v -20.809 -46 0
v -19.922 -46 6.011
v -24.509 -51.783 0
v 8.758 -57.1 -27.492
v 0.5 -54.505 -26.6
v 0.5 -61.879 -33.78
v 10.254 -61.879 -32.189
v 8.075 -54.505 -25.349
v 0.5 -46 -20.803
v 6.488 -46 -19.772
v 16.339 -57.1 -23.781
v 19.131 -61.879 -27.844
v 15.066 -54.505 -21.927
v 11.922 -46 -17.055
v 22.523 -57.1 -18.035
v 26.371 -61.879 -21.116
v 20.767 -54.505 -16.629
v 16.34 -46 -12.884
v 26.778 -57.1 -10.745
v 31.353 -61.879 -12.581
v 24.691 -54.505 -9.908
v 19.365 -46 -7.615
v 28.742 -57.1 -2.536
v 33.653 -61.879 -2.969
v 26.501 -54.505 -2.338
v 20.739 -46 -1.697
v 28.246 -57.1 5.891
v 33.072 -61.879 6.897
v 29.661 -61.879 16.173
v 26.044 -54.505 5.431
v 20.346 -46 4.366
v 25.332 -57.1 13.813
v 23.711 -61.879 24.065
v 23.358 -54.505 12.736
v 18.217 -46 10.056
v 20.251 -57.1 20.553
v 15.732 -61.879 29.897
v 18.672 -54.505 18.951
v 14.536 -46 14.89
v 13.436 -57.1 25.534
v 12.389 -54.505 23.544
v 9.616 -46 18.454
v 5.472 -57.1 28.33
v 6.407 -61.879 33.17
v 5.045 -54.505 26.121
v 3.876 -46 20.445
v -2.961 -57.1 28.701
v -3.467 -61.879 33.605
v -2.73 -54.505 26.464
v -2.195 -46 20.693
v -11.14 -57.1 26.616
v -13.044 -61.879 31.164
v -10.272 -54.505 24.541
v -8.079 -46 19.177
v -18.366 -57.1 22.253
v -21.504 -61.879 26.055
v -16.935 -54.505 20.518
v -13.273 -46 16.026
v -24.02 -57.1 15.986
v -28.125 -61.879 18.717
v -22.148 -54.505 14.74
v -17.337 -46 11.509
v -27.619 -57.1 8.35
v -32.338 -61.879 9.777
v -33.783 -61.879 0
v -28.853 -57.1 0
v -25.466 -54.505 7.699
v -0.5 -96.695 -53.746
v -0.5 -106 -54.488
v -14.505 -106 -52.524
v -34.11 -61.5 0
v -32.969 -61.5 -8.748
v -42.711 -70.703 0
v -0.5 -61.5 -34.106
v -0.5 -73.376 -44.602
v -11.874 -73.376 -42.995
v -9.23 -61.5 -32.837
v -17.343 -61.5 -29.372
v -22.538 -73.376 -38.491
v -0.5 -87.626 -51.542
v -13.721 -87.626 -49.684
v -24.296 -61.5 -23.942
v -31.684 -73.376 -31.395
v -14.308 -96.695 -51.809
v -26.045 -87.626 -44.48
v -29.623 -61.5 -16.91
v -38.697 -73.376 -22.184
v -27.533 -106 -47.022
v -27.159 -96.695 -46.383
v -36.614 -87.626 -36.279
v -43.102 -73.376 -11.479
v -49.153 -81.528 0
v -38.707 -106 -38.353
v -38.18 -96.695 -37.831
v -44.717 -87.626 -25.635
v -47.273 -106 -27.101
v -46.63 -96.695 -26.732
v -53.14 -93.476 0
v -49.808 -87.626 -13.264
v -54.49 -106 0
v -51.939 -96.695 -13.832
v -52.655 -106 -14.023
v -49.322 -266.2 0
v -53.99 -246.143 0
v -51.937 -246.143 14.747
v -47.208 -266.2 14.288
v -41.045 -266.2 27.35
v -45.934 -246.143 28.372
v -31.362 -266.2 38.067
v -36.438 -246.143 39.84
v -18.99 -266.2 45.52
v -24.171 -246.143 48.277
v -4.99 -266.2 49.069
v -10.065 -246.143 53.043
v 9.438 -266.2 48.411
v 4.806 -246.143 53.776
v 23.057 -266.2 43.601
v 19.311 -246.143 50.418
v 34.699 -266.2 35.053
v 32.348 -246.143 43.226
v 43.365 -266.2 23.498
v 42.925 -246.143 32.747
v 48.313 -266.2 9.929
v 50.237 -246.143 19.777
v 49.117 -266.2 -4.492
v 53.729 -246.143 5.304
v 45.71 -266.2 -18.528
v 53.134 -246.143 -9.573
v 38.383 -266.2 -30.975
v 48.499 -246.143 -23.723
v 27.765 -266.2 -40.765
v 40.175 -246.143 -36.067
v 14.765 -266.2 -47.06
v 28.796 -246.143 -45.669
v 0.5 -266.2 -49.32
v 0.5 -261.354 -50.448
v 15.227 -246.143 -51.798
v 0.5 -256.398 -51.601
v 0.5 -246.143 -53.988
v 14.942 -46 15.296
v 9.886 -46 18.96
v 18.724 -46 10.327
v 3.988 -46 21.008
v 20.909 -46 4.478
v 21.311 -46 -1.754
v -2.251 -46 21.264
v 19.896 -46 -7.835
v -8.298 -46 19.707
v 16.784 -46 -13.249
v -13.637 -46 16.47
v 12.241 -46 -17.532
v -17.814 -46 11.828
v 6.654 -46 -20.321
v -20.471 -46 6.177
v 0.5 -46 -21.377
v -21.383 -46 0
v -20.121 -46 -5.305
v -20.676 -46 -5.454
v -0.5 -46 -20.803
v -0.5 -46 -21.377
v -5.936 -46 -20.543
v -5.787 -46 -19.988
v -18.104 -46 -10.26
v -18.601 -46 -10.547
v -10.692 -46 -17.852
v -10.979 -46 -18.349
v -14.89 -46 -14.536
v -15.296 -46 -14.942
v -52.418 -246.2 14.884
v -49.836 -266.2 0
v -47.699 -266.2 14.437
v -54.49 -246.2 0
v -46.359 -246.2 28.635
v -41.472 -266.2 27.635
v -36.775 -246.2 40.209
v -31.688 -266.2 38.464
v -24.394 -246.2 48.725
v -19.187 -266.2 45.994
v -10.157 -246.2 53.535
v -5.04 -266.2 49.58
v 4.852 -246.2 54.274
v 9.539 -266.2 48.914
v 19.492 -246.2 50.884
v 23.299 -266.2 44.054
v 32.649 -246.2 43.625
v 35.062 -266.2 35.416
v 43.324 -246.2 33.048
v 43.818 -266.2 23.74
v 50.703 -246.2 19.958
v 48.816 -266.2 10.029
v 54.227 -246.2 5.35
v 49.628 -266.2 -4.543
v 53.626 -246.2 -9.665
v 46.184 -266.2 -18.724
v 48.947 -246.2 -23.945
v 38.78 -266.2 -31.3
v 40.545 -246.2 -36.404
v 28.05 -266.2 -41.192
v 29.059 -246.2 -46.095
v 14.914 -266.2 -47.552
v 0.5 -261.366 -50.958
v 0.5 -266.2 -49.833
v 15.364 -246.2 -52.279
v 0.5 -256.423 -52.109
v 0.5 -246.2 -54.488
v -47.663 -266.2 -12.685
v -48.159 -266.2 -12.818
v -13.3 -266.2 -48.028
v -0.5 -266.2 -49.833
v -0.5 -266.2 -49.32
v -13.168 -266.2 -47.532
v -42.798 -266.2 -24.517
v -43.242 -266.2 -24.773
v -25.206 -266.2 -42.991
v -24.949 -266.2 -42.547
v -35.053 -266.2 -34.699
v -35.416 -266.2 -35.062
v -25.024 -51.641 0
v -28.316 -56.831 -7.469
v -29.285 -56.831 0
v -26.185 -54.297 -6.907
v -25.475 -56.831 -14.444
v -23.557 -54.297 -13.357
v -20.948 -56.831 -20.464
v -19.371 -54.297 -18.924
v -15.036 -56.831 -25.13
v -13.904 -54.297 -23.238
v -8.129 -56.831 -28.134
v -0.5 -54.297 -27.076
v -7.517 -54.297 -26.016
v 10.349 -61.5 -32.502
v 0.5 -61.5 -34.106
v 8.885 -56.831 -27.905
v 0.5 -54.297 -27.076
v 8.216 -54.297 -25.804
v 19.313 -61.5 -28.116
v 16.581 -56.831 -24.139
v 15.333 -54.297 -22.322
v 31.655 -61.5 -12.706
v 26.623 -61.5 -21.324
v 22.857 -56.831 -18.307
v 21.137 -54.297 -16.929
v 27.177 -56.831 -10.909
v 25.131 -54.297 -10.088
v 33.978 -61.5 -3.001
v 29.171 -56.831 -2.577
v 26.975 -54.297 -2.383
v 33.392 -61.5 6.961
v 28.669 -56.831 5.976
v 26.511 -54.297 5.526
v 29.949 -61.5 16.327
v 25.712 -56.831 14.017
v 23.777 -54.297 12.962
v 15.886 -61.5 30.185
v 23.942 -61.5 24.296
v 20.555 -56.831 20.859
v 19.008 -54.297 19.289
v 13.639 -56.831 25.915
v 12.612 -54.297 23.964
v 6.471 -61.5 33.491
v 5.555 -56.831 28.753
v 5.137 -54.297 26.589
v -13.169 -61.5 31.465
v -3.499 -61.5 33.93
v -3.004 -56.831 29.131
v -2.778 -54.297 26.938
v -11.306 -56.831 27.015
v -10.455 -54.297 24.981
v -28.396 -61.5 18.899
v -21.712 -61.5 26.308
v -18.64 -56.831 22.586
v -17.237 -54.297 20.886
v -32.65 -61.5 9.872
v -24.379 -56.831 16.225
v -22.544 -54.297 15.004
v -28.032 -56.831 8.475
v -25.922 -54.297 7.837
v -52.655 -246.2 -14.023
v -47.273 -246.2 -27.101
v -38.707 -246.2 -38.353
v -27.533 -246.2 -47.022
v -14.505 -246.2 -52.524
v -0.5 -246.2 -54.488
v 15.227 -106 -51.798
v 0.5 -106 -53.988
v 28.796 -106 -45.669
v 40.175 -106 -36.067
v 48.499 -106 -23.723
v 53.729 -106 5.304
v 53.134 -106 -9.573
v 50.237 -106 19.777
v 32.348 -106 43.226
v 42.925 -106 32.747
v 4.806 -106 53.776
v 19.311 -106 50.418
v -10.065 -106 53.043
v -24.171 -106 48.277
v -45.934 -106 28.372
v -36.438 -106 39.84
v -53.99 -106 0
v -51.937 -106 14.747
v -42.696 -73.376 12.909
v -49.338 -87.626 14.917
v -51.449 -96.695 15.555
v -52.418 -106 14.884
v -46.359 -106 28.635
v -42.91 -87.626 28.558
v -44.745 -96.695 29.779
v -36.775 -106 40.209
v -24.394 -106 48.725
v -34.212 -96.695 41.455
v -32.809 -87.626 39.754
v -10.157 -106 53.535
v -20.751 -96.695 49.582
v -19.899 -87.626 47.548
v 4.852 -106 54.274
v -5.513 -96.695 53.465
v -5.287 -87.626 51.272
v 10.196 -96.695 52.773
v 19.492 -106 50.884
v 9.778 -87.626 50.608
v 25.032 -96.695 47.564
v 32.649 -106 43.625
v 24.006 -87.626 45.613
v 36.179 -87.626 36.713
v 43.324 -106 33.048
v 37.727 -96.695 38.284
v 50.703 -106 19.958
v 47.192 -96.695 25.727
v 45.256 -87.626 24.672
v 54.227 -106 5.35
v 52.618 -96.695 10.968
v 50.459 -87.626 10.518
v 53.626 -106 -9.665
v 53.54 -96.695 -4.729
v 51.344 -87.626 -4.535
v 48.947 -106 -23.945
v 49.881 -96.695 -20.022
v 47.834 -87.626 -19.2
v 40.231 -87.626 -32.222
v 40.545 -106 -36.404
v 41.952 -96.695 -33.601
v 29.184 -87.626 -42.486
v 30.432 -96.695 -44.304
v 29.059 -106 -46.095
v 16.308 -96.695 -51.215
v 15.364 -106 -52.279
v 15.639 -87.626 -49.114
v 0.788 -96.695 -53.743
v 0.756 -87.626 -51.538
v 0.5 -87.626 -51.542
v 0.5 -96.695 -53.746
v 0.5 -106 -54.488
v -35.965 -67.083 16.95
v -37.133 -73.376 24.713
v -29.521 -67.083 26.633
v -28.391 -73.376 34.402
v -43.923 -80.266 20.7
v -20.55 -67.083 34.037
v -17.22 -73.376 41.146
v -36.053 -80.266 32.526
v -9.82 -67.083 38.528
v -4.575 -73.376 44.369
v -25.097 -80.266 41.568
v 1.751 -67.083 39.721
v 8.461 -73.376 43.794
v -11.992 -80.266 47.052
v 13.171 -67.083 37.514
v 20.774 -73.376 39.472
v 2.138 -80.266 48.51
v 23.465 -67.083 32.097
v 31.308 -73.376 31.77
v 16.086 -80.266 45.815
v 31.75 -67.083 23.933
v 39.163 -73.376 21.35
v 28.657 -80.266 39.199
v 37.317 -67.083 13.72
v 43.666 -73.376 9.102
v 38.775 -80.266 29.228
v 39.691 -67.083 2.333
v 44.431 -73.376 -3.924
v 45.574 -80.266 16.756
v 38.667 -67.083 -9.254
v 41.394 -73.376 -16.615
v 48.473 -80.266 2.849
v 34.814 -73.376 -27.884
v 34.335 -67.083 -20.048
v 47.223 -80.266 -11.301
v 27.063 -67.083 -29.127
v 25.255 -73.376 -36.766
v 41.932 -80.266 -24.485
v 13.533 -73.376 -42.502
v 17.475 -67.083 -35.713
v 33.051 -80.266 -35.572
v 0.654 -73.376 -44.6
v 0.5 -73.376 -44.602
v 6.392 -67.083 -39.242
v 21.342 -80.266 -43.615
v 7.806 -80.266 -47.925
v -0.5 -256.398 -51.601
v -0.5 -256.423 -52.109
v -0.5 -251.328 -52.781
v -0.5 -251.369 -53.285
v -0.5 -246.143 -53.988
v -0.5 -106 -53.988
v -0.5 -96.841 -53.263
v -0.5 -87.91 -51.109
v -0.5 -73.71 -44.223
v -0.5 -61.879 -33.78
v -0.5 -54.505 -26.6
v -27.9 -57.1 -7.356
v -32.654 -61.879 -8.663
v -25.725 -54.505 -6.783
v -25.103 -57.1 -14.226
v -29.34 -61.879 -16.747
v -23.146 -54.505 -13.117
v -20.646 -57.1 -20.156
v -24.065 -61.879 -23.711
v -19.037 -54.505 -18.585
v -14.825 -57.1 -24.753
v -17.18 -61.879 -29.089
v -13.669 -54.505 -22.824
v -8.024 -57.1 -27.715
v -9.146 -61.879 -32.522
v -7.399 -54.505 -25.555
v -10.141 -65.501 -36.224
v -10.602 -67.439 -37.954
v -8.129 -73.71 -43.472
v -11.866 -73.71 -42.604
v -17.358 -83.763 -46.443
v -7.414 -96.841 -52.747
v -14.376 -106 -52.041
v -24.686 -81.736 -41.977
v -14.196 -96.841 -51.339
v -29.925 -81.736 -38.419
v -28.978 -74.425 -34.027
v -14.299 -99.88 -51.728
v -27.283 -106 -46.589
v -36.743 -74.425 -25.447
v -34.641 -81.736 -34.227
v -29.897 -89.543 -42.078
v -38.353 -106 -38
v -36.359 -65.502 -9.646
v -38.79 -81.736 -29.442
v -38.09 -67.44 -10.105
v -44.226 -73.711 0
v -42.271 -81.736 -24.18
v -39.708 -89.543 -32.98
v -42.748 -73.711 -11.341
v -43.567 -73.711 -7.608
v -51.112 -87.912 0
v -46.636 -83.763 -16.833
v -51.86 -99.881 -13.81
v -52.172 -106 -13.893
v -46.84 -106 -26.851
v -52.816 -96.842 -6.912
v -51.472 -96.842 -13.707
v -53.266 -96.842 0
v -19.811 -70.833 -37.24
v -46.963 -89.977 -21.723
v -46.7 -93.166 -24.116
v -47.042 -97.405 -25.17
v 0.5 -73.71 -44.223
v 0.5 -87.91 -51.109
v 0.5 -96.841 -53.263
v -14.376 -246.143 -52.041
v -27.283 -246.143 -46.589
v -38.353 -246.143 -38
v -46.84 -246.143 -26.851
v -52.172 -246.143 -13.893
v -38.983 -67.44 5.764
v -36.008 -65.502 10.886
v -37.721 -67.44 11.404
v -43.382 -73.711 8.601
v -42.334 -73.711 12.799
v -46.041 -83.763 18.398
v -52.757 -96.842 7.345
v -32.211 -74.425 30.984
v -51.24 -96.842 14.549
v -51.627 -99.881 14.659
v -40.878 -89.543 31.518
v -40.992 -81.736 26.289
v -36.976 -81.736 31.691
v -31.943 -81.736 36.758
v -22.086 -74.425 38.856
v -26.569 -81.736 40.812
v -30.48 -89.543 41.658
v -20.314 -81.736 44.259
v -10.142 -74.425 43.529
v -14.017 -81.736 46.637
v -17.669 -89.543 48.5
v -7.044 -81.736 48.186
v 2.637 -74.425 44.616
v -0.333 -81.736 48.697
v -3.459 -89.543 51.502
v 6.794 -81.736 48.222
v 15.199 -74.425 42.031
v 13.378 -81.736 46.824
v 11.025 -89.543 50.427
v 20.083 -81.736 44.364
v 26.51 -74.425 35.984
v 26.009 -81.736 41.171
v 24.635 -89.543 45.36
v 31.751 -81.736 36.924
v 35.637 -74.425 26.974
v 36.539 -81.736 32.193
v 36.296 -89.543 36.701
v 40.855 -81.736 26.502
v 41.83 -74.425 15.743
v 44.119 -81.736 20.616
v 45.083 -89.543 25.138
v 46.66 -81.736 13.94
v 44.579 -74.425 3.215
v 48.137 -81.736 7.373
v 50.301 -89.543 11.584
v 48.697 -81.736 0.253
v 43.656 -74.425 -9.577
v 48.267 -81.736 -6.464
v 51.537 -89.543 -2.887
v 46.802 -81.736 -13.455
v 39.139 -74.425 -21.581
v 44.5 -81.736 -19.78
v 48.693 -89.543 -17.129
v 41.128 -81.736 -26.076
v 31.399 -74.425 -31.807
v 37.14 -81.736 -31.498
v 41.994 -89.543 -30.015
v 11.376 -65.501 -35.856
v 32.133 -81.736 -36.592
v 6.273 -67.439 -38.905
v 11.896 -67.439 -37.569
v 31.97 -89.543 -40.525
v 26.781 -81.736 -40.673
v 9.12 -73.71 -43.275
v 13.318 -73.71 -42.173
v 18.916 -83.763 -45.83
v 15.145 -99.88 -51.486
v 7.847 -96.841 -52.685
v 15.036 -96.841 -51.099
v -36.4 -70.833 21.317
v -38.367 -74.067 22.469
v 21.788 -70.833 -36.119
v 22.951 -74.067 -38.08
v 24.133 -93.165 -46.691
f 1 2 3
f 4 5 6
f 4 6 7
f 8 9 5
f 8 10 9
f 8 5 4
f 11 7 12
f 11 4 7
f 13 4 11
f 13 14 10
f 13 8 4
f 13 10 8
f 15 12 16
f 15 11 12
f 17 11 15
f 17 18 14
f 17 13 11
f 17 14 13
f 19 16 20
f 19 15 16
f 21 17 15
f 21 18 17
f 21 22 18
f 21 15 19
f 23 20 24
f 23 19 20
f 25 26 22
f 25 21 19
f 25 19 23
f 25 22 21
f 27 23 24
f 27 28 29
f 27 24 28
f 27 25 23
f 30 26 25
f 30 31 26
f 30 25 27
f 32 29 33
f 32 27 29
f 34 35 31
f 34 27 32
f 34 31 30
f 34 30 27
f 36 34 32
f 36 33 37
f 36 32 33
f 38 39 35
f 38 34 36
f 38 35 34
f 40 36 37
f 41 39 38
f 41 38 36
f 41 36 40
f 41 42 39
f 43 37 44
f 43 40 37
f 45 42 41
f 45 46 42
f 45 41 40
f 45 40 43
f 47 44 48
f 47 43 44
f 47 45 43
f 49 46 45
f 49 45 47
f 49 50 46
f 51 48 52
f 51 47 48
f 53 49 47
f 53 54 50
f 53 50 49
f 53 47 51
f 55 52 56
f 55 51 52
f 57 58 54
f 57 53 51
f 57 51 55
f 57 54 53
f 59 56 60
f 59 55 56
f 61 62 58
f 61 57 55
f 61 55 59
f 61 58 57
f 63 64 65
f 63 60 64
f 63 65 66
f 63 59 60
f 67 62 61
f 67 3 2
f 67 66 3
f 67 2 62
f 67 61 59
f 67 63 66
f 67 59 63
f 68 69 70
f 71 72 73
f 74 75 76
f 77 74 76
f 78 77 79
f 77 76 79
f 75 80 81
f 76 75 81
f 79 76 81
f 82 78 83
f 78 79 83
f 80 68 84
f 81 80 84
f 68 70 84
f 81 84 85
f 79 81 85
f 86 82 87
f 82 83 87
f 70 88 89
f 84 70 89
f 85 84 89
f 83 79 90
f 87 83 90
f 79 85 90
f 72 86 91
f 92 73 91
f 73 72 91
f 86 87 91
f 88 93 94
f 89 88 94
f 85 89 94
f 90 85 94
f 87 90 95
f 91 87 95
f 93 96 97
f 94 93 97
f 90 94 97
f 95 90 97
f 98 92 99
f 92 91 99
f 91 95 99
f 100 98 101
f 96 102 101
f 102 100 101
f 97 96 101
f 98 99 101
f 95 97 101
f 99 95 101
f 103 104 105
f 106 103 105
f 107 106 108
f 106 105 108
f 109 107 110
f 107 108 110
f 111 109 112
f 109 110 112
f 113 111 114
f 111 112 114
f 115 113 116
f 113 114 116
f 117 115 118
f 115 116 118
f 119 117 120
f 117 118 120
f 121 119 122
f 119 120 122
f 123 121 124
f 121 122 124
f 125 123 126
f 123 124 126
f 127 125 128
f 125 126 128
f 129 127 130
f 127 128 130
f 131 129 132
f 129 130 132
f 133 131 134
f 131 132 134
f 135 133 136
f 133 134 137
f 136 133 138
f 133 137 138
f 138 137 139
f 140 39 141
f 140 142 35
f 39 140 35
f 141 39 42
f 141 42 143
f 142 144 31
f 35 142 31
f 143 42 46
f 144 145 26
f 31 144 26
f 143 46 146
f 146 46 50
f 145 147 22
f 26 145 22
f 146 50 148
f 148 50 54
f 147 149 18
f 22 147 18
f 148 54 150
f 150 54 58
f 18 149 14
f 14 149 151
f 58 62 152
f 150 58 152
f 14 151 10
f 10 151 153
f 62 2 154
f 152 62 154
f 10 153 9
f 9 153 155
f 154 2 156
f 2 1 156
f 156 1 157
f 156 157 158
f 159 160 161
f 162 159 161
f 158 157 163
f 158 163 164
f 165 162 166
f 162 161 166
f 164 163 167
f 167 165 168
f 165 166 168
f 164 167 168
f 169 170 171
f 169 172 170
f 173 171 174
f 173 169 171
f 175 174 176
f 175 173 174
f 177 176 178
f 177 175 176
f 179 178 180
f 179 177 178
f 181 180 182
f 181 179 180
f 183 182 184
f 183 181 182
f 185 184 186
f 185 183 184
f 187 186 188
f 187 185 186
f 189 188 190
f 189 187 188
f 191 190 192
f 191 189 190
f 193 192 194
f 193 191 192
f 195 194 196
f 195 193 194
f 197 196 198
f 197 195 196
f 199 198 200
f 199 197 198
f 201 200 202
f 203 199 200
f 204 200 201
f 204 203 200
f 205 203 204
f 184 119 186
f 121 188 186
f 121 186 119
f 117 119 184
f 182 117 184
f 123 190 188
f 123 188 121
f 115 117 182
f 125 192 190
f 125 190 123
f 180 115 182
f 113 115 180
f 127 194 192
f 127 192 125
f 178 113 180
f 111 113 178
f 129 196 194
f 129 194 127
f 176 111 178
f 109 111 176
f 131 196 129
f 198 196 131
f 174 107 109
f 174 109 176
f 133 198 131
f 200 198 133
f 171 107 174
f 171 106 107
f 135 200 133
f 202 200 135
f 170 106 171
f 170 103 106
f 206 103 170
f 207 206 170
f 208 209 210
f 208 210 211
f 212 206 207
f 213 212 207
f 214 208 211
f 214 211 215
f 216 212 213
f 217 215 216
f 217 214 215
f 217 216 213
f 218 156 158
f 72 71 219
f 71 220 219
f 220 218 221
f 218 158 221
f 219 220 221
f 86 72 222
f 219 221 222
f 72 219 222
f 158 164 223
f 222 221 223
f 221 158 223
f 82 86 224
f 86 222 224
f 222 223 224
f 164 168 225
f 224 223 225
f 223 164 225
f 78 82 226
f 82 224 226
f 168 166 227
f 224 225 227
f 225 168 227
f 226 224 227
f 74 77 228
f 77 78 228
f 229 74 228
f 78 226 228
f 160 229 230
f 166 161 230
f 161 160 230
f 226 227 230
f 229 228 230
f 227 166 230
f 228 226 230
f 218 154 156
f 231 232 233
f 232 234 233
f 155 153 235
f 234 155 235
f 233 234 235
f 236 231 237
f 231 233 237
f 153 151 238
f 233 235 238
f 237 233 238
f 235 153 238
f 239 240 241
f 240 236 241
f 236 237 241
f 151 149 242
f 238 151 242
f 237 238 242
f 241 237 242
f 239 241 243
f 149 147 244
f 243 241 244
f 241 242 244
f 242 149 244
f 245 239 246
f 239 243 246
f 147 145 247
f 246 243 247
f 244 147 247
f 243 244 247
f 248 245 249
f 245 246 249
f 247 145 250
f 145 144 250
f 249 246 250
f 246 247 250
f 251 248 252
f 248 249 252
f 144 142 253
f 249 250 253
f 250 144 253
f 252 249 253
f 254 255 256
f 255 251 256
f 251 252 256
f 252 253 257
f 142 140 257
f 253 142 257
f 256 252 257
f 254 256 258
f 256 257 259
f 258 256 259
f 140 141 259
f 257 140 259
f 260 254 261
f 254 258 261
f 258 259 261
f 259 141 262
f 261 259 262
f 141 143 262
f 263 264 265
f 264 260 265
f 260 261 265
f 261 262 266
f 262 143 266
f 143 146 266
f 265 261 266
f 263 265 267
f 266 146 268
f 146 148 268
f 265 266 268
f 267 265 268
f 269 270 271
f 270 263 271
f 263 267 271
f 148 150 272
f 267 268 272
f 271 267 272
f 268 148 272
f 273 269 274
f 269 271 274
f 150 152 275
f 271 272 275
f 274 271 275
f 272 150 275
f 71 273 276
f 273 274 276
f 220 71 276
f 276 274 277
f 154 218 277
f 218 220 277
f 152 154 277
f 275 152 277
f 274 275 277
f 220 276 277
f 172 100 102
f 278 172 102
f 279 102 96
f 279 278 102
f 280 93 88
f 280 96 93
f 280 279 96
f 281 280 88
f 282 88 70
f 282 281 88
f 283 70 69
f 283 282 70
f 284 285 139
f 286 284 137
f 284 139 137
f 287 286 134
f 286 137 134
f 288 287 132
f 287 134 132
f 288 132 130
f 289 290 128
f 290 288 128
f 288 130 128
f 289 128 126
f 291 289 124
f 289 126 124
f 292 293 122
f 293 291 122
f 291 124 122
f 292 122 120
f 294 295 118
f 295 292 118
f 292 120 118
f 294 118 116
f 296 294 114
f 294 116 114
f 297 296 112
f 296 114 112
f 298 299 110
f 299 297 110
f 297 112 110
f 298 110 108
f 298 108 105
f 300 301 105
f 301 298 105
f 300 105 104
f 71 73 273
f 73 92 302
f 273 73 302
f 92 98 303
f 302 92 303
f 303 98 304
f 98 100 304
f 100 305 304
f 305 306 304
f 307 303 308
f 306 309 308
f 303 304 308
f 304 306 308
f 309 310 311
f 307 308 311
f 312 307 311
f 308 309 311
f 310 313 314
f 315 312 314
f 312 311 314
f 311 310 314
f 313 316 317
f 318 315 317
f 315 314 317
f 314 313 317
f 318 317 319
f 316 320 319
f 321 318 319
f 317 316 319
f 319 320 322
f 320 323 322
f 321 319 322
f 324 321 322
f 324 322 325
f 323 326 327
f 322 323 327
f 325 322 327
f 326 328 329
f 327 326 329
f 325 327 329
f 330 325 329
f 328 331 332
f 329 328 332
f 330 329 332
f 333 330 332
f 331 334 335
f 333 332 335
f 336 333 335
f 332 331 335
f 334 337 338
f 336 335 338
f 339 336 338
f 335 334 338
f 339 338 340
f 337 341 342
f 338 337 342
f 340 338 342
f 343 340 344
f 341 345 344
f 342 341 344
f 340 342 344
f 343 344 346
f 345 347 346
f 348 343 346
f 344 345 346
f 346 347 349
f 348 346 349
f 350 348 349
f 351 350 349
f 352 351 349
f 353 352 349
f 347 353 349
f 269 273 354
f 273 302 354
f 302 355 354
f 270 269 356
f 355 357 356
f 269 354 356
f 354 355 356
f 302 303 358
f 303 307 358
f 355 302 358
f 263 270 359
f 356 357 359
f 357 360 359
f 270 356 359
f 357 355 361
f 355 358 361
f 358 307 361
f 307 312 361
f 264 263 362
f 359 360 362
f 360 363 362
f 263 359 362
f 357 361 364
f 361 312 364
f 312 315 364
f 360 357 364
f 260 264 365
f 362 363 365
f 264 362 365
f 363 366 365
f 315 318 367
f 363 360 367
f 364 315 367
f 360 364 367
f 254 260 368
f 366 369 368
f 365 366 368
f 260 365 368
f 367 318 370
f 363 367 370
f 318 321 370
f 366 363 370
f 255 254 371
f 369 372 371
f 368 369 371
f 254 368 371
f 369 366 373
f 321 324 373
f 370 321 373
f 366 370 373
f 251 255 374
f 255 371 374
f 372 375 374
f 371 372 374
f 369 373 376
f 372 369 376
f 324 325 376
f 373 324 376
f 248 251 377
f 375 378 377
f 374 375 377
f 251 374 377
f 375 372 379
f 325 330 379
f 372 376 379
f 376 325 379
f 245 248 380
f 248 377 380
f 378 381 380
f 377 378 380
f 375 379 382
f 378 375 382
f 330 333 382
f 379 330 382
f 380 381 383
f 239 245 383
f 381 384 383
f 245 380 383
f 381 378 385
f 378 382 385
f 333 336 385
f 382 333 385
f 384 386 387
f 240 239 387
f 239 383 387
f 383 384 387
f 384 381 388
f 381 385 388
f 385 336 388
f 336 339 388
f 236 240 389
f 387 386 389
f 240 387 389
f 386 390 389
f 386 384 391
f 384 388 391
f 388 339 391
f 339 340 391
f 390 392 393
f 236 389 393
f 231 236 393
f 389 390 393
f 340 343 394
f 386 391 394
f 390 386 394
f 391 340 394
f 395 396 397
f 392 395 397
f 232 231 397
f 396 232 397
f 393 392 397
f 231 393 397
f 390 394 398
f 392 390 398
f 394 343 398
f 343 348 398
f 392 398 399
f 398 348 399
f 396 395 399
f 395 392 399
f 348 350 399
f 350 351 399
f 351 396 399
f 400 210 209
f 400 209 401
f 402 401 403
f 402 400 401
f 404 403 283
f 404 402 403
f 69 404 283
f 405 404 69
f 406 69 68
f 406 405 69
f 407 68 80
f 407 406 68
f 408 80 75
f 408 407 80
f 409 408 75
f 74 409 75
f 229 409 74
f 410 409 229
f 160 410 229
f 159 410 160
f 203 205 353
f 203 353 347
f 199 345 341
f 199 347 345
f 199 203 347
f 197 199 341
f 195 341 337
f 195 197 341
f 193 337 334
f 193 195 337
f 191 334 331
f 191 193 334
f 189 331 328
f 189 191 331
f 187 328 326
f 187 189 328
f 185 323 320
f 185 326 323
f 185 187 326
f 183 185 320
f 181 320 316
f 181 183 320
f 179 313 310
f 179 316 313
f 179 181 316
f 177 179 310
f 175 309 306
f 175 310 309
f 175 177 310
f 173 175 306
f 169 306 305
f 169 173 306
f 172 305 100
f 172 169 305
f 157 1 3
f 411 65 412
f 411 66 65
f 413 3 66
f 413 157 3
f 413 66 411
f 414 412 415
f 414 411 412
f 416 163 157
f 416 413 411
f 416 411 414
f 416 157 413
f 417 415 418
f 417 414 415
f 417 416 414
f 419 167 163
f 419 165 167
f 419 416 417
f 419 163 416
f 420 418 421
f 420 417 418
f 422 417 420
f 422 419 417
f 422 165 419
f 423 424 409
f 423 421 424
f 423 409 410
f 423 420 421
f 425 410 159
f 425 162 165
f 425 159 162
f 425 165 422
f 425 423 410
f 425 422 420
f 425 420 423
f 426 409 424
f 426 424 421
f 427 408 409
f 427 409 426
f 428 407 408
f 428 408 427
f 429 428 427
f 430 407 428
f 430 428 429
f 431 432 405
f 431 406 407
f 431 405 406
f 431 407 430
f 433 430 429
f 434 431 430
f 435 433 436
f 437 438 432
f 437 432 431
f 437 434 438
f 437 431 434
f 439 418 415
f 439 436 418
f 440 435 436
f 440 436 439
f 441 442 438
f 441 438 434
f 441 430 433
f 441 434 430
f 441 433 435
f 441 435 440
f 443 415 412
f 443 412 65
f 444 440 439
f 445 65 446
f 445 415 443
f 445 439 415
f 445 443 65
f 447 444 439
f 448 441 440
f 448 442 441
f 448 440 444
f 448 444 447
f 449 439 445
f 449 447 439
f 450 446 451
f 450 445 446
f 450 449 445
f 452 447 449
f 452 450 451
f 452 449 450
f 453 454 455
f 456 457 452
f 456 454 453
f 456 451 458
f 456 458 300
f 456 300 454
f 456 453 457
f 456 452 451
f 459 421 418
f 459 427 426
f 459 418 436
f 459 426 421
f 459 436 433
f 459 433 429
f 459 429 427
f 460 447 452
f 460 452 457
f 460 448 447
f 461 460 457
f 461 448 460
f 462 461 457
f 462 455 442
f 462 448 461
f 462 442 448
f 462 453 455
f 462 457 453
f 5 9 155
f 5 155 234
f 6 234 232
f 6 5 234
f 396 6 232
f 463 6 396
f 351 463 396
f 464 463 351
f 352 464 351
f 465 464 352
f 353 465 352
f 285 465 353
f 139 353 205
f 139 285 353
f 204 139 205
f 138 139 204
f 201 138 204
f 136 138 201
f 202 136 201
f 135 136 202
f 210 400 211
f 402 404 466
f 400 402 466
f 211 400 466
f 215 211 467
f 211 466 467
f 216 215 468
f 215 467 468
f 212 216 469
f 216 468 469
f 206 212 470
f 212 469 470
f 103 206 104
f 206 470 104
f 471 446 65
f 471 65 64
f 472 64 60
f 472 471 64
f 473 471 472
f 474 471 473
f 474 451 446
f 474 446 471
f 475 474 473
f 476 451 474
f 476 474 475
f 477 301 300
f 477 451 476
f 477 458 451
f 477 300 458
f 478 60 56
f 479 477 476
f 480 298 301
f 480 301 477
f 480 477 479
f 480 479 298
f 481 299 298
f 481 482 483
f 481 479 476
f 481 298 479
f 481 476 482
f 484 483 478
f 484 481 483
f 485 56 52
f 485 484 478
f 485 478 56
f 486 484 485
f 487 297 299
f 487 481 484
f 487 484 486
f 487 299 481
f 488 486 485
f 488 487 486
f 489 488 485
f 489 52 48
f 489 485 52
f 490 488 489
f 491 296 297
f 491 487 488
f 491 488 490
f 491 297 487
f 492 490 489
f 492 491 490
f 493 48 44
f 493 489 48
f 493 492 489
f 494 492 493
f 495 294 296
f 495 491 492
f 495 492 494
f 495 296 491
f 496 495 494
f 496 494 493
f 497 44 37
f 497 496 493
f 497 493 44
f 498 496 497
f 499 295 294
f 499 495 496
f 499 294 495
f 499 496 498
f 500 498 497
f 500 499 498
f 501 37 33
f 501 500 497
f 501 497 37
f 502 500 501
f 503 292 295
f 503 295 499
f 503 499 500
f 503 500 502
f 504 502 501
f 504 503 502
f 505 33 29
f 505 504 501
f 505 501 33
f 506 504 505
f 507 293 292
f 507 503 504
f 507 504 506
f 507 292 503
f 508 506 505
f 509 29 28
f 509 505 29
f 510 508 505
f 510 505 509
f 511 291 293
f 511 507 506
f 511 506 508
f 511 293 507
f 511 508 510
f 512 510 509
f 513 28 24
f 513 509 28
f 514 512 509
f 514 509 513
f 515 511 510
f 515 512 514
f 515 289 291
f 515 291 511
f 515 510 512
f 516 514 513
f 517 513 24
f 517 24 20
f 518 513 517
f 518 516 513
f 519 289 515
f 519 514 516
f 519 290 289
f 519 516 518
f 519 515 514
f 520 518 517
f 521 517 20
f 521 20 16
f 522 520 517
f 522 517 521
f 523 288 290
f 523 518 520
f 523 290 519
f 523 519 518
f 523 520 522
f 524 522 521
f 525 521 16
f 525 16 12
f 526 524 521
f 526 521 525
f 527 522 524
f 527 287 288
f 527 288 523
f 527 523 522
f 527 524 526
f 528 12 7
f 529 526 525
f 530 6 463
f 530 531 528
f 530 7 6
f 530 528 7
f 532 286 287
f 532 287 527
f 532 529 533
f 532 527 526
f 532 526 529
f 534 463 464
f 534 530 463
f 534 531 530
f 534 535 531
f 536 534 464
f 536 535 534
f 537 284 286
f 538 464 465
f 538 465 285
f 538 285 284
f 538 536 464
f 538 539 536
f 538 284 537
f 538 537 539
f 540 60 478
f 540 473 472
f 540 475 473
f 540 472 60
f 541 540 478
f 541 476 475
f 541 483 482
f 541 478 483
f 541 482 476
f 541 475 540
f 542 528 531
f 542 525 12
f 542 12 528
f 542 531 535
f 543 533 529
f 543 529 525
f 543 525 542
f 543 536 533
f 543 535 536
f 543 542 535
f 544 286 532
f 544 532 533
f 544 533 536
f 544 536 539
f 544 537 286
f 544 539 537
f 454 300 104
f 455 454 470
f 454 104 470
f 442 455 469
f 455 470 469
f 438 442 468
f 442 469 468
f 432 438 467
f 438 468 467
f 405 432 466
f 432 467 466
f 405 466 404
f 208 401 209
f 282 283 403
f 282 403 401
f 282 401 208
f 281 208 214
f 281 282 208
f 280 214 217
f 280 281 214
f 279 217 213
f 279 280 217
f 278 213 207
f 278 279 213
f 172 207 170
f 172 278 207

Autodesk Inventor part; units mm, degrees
ref_plane "YZ Plane" through (0, 0, 0) normal (1, 0, 0) x (0, 1, 0)
ref_plane "XZ Plane" through (0, 0, 0) normal (0, 1, 0) x (-1, 0, 0)
ref_plane "XY Plane" through (0, 0, 0) normal (0, 0, 1) x (1, 0, 0)
sketch "Sketch1" plane through (0, 0, 0) normal (0, 0, 1) x (1, 0, 0)
  line L0 (0, 0) -> (-13.73, 0)
  line L1 (-13.73, 0) -> (-13.73, -17)
  arc A0 (-34.11, -61.5) -> (-13.73, -17) centre (-72.5032, -17) ccw
  arc A1 (-34.11, -61.5) -> (-54.49, -106) centre (4.2832, -106) ccw
  line L2 (-54.49, -106) -> (-54.49, -246.2)
  line L3 (-54.49, -246.2) -> (-42.6683, -297)
  line L4 (-42.6683, -297) -> (0, -297)
  line L5 (0, -297) -> (0, 0)
  line L6 (0, -356.4) -> (0, 59.4) projected
  dimension "d0" = 13.73
  dimension "d1" = 17
  dimension "d2" = 54.49
  dimension "d3" = 106
  dimension "d4" = 13.1
  dimension "d5" = 297
  dimension "d6" = 50.8
revolve "Revolution1" add sketch "Sketch1" angle 360 about axis through (0, -10, 0) along (0, 1, 0)
shell "Shell1" thickness 0.5 removed faces 1 at (0.5517, 0, -4.0152)
sketch "Sketch2" plane through (0, 0, 0) normal (0, 0, 1) x (1, 0, 0)
  line L0 (53.99, -106) -> (-53.99, -106) projected
  line L1 (13.73, 0) -> (-13.73, 0) construction
  line L2 (-53.99, 0) -> (53.99, 0)
  line L3 (53.99, 0) -> (53.99, -46)
  line L4 (53.99, -46) -> (-53.99, -46)
  line L5 (-53.99, -46) -> (-53.99, 0)
  line L6 (53.99, -266.2) -> (-53.99, -266.2)
  line L7 (-53.99, -266.2) -> (-53.99, -297)
  line L8 (-53.99, -297) -> (53.99, -297)
  line L9 (53.99, -297) -> (53.99, -266.2)
  line L10 (42.6683, -297) -> (-42.6683, -297) projected
  line L11 (54.49, -246.2) -> (-54.49, -246.2) projected
  point P0 (0, 0)
  dimension "d10" = 60
  dimension "d11" = 20
extrude "circumferentialCuts" cut sketch "Sketch2" along normal through all both and the other way through all
sketch "Sketch3" plane through (0, 0, 0) normal (0, 0, 1) x (1, 0, 0)
  line L0 (-0.5, 0) -> (0.5, 0)
  line L1 (0.5, 0) -> (0.5, -266.2)
  line L2 (0.5, -266.2) -> (-0.5, -266.2)
  line L3 (-0.5, -266.2) -> (-0.5, 0)
  line L4 (49.8358, -266.2) -> (-49.8358, -266.2) projected
  point P0 (0, 0)
  point P1 (0, 0)
  dimension "d15" = 1
extrude "vertical" cut sketch "Sketch3" against normal through all
sketch "Sketch4" plane through (340.0931, -246.1426, -50.8714) normal (-0.0092, 0, 1) x (1, 0, 0.0092)
  line L0 (-31, 200.1426) -> (-30, 200.1426)
  line L1 (-30, 200.1426) -> (-30, 30)
  line L2 (-30, 30) -> (-31, 30)
  line L3 (-31, 30) -> (-31, 200.1426)
  line L4 (-309.6074, 200.1426) -> (-308.6074, 200.1426)
  line L5 (-308.6074, 200.1426) -> (-308.6074, 30)
  line L6 (-308.6074, 30) -> (-309.6074, 30)
  line L7 (-309.6074, 30) -> (-309.6074, 200.1426)
  line L8 (-0.8007, 200.1426) -> (-338.8067, 200.1426) projected
  line L9 (0, 0) -> (0, 140.1426) projected
  line L10 (0, 0) -> (-339.6074, 0) projected
  line L11 (-339.6074, 140.1426) -> (-339.6074, 0) projected
  dimension "d18" = 1
  dimension "d19" = 30
  dimension "d20" = 30
  dimension "d21" = 30
sketch "Sketch16" plane through (340.1023, -246.2, -51.3714) normal (0.0092, 0, -1) x (-1, 0, -0.0092)
  line L0 (0, 1) -> (30.0046, 31.0046)
  line L1 (30.0046, 30.0574) -> (30.0046, 140.2) projected
  line L2 (0, 140.2) -> (0, 0) projected
  point P0 (339.6166, 246.2)
  dimension "d87" = 45
  dimension "d88" = 1
sketch "Sketch23" plane through (0.5, -246.2, -54.4877) normal (0.0092, 0, -1) x (-1, 0, -0.0092)
  line L0 (0, 1) -> (-30.0046, 31.0046)
  line L1 (0, 0) -> (0, 140.2) projected
  line L2 (-30.0046, 140.2) -> (-30.0046, 30.0574) projected
  line L3 (-339.6166, 0) -> (0, 0) projected
  point P0 (0, 246.2)
  dimension "d136" = 45
  dimension "d137" = 1
sketch "Sketch17" plane through (202.4892, -243.6006, -50.6341) normal (-0.0092, 0, 1) x (1, 0, 0.0092)
  line L0 (105.596, 0) -> (105.596, 30.0046)
  line L1 (105.9965, 30.0046) -> (0, 30.0046) projected
  line L2 (0, 0) -> (136.0011, 0) projected
  line L3 (106.596, 27.458) -> (106.596, 137.6006) projected
  point P0 (-202.016, 243.6006)
  dimension "d101" = 1
sketch "Sketch24" plane through (2.081, -243.6006, -52.4731) normal (-0.0092, 0, 1) x (1, 0, 0.0092)
  line L0 (31.0046, 30.0046) -> (31.0046, 0)
  line L1 (-1.5994, 0) -> (136.0011, 0) projected
  line L2 (136.0011, 30.0046) -> (28.4052, 30.0046) projected
  point P0 (-1.5994, 243.6006)
  point P1 (0, 0)
  point P2 (136.0011, 0)
  point P3 (30.0046, 30.0046)
  point P4 (-1.5994, -2.5994)
  point P5 (28.4052, 27.458)
  dimension "d138" = 1
equation "\"d13\" = Thickness"
equation "\"d16\" = Thickness"
equation "\"BendRadius\" = Thickness"
equation "\"BendReliefWidth\" = Thickness"
equation "\"BendReliefDepth\" = 0.5 * Thickness"
equation "\"CornerReliefSize\" = 4 * Thickness"
equation "\"MinimumRemnant\" = 2 * Thickness"
equation "\"TransitionRadius\" = BendRadius"
equation "\"JacobiRadiusSize\" = BendRadius"
equation "\"GapSize\" = Thickness"
equation "\"Thickness\" = 0.5"
properties material "PET Plastic"
